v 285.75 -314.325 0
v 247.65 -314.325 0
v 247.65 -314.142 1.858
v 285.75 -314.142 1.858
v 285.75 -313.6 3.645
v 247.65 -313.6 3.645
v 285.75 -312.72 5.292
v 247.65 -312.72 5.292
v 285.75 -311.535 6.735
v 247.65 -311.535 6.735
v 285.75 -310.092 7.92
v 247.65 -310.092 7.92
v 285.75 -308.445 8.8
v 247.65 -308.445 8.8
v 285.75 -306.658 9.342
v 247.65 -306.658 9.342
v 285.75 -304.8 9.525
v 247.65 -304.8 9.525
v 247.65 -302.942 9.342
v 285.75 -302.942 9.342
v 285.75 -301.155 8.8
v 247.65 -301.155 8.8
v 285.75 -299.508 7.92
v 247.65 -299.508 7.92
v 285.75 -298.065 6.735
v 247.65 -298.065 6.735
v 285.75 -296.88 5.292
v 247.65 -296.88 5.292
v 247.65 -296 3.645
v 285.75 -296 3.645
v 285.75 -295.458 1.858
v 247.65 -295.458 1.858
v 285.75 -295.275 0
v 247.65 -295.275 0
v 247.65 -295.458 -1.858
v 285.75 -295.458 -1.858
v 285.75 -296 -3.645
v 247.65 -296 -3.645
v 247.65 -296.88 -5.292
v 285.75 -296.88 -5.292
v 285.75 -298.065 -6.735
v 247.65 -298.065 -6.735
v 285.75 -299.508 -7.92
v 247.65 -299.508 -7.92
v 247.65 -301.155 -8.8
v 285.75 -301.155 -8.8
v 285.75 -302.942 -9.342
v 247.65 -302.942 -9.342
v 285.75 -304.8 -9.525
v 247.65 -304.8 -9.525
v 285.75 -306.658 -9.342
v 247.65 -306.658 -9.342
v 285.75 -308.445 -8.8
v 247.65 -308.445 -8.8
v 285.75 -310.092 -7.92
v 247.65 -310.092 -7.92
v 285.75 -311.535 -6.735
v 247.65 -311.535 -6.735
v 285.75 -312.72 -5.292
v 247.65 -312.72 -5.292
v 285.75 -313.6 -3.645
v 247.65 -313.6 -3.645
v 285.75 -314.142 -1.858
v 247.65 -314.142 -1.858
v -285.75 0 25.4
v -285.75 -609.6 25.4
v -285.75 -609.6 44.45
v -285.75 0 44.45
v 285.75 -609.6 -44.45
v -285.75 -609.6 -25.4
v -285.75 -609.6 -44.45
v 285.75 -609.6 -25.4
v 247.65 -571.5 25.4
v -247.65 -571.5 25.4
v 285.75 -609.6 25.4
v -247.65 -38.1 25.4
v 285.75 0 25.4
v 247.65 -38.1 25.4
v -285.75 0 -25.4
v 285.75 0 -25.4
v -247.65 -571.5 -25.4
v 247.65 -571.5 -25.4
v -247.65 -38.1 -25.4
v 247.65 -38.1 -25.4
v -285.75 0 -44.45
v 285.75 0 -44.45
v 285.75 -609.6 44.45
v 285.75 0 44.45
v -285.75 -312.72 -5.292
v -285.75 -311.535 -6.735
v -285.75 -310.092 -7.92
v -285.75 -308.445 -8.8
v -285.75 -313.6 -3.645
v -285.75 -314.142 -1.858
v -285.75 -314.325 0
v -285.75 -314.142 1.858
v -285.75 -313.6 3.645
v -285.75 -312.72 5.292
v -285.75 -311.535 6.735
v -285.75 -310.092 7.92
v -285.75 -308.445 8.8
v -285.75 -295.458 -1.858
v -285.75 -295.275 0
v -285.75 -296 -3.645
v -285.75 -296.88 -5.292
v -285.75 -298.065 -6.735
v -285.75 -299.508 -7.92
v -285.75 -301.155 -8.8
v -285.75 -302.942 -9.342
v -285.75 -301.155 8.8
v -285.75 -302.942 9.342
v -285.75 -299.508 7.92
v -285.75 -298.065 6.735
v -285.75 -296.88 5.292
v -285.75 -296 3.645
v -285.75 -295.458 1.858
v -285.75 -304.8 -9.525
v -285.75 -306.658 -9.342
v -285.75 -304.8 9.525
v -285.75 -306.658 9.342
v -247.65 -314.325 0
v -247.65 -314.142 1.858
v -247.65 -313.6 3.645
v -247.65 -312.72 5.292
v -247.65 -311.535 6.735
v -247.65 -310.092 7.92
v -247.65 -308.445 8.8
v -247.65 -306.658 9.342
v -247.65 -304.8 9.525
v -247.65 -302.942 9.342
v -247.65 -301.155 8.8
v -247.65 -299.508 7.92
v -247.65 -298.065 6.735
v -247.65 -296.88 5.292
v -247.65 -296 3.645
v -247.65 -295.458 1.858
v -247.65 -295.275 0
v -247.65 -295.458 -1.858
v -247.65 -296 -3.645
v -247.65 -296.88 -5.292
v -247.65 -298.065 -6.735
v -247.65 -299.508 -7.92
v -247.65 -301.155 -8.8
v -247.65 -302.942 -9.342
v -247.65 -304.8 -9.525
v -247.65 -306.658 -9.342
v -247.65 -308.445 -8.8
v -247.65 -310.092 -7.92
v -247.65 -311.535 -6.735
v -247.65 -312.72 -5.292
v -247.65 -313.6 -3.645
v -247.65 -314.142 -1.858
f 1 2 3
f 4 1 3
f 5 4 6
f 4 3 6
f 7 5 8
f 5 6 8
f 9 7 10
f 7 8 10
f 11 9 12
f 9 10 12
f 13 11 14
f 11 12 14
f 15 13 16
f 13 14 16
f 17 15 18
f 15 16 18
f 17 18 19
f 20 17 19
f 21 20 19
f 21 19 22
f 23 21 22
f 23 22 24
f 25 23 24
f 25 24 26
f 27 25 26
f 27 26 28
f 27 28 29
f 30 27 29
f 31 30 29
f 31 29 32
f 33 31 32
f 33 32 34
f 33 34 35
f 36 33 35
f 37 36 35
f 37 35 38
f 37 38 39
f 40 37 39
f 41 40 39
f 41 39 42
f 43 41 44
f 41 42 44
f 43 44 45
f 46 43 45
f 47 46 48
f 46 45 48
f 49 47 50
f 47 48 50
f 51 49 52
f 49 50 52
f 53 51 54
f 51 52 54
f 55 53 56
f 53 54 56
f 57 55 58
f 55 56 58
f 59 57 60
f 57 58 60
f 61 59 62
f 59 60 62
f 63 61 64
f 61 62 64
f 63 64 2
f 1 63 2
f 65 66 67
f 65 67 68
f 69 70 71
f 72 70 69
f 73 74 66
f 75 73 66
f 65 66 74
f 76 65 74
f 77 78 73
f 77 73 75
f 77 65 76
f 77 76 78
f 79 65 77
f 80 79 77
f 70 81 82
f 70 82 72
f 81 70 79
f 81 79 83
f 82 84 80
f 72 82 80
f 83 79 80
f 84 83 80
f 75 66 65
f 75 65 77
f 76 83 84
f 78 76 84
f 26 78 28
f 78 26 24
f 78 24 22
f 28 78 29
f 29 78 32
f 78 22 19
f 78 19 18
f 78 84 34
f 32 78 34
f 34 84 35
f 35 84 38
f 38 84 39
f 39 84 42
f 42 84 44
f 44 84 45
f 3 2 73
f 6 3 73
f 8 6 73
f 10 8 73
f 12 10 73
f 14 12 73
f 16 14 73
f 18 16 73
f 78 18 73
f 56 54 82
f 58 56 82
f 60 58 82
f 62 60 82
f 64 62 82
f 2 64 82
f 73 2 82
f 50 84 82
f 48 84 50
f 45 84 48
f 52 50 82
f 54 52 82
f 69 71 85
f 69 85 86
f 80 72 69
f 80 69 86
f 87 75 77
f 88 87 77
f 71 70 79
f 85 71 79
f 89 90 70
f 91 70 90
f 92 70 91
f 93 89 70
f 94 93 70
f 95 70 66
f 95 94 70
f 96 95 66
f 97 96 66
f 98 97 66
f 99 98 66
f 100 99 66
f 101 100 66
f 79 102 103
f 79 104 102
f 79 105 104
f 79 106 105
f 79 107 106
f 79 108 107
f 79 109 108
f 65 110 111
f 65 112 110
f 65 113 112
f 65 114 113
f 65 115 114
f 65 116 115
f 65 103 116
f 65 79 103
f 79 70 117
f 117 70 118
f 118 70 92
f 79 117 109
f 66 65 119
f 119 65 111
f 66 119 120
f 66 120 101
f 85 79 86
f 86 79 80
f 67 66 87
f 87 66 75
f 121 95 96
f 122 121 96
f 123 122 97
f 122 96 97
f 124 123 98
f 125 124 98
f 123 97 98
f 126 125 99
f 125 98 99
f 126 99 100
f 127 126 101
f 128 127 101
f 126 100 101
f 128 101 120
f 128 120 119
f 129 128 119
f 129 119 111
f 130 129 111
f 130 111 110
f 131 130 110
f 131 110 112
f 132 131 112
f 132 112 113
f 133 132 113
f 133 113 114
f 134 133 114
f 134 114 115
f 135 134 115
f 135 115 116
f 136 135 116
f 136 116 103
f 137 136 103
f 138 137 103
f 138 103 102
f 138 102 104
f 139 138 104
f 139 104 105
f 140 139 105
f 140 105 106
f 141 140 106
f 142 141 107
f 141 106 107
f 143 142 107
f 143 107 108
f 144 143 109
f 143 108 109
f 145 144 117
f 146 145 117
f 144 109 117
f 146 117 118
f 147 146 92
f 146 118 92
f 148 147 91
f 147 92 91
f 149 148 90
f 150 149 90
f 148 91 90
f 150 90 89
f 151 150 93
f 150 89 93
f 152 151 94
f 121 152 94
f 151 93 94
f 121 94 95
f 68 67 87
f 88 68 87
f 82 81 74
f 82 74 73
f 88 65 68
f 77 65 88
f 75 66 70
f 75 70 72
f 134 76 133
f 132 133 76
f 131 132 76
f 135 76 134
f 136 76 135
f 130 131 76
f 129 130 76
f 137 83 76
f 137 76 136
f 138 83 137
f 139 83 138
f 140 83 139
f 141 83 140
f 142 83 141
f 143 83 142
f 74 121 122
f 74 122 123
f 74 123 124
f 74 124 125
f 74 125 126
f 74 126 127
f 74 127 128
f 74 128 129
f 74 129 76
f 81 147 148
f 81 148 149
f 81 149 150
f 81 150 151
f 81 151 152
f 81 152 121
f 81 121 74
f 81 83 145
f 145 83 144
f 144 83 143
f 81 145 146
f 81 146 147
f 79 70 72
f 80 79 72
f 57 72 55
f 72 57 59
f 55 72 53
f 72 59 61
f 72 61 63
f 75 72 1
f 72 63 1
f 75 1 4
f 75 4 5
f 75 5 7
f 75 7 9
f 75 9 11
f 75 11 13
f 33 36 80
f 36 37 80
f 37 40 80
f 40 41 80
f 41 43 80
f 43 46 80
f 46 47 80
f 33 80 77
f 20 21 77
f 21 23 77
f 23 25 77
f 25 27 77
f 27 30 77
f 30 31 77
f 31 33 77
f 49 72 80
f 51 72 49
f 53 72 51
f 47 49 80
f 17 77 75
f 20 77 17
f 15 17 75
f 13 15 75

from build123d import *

# Parameters (mm, degrees)
F0_W     = 571.5
F0_H     = 50.8
F1_DEPTH = 609.6
F2_R     = 9.525
F3_DEPTH = 571.501
F4_W     = 495.3
F4_H     = 533.4
F5_DEPTH = 50.801
F6_W     = 571.5
F6_H     = 609.6
F7_DEPTH = 19.05


with BuildPart() as f1:
    # F0 (on Front) → F1 (new body)
    with BuildSketch(Plane.XZ):
        Rectangle(F0_W, F0_H)
    extrude(amount=F1_DEPTH)

    # F2 (on face) → F3 (cut, through all)
    with BuildSketch(Plane(origin=(-285.75, 0, 0), x_dir=(0, -1, 0), z_dir=(-1, 0, 0))):
        with Locations((304.8, 0)):
            Circle(F2_R)
    extrude(amount=-F3_DEPTH, mode=Mode.SUBTRACT)

    # F4 (on face) → F5 (cut, through all)
    with BuildSketch(Plane(origin=(0, 0, -25.4), x_dir=(1, 0, 0), z_dir=(0, 0, -1))):
        with Locations((0, 304.8)):
            Rectangle(F4_W, F4_H)
    extrude(amount=-F5_DEPTH, mode=Mode.SUBTRACT)


with BuildPart() as f7:
    # F6 (on face) → F7 (new body)
    with BuildSketch(Plane.XY.offset(25.4)):
        with Locations((0, -304.8)):
            Rectangle(F6_W, F6_H)
    extrude(amount=F7_DEPTH)


with BuildPart() as f8_1:
    # F8: instance of F7
    add(f7.part.mirror(Plane.XY))


solid = Compound([f1.part, f7.part, f8_1.part])
